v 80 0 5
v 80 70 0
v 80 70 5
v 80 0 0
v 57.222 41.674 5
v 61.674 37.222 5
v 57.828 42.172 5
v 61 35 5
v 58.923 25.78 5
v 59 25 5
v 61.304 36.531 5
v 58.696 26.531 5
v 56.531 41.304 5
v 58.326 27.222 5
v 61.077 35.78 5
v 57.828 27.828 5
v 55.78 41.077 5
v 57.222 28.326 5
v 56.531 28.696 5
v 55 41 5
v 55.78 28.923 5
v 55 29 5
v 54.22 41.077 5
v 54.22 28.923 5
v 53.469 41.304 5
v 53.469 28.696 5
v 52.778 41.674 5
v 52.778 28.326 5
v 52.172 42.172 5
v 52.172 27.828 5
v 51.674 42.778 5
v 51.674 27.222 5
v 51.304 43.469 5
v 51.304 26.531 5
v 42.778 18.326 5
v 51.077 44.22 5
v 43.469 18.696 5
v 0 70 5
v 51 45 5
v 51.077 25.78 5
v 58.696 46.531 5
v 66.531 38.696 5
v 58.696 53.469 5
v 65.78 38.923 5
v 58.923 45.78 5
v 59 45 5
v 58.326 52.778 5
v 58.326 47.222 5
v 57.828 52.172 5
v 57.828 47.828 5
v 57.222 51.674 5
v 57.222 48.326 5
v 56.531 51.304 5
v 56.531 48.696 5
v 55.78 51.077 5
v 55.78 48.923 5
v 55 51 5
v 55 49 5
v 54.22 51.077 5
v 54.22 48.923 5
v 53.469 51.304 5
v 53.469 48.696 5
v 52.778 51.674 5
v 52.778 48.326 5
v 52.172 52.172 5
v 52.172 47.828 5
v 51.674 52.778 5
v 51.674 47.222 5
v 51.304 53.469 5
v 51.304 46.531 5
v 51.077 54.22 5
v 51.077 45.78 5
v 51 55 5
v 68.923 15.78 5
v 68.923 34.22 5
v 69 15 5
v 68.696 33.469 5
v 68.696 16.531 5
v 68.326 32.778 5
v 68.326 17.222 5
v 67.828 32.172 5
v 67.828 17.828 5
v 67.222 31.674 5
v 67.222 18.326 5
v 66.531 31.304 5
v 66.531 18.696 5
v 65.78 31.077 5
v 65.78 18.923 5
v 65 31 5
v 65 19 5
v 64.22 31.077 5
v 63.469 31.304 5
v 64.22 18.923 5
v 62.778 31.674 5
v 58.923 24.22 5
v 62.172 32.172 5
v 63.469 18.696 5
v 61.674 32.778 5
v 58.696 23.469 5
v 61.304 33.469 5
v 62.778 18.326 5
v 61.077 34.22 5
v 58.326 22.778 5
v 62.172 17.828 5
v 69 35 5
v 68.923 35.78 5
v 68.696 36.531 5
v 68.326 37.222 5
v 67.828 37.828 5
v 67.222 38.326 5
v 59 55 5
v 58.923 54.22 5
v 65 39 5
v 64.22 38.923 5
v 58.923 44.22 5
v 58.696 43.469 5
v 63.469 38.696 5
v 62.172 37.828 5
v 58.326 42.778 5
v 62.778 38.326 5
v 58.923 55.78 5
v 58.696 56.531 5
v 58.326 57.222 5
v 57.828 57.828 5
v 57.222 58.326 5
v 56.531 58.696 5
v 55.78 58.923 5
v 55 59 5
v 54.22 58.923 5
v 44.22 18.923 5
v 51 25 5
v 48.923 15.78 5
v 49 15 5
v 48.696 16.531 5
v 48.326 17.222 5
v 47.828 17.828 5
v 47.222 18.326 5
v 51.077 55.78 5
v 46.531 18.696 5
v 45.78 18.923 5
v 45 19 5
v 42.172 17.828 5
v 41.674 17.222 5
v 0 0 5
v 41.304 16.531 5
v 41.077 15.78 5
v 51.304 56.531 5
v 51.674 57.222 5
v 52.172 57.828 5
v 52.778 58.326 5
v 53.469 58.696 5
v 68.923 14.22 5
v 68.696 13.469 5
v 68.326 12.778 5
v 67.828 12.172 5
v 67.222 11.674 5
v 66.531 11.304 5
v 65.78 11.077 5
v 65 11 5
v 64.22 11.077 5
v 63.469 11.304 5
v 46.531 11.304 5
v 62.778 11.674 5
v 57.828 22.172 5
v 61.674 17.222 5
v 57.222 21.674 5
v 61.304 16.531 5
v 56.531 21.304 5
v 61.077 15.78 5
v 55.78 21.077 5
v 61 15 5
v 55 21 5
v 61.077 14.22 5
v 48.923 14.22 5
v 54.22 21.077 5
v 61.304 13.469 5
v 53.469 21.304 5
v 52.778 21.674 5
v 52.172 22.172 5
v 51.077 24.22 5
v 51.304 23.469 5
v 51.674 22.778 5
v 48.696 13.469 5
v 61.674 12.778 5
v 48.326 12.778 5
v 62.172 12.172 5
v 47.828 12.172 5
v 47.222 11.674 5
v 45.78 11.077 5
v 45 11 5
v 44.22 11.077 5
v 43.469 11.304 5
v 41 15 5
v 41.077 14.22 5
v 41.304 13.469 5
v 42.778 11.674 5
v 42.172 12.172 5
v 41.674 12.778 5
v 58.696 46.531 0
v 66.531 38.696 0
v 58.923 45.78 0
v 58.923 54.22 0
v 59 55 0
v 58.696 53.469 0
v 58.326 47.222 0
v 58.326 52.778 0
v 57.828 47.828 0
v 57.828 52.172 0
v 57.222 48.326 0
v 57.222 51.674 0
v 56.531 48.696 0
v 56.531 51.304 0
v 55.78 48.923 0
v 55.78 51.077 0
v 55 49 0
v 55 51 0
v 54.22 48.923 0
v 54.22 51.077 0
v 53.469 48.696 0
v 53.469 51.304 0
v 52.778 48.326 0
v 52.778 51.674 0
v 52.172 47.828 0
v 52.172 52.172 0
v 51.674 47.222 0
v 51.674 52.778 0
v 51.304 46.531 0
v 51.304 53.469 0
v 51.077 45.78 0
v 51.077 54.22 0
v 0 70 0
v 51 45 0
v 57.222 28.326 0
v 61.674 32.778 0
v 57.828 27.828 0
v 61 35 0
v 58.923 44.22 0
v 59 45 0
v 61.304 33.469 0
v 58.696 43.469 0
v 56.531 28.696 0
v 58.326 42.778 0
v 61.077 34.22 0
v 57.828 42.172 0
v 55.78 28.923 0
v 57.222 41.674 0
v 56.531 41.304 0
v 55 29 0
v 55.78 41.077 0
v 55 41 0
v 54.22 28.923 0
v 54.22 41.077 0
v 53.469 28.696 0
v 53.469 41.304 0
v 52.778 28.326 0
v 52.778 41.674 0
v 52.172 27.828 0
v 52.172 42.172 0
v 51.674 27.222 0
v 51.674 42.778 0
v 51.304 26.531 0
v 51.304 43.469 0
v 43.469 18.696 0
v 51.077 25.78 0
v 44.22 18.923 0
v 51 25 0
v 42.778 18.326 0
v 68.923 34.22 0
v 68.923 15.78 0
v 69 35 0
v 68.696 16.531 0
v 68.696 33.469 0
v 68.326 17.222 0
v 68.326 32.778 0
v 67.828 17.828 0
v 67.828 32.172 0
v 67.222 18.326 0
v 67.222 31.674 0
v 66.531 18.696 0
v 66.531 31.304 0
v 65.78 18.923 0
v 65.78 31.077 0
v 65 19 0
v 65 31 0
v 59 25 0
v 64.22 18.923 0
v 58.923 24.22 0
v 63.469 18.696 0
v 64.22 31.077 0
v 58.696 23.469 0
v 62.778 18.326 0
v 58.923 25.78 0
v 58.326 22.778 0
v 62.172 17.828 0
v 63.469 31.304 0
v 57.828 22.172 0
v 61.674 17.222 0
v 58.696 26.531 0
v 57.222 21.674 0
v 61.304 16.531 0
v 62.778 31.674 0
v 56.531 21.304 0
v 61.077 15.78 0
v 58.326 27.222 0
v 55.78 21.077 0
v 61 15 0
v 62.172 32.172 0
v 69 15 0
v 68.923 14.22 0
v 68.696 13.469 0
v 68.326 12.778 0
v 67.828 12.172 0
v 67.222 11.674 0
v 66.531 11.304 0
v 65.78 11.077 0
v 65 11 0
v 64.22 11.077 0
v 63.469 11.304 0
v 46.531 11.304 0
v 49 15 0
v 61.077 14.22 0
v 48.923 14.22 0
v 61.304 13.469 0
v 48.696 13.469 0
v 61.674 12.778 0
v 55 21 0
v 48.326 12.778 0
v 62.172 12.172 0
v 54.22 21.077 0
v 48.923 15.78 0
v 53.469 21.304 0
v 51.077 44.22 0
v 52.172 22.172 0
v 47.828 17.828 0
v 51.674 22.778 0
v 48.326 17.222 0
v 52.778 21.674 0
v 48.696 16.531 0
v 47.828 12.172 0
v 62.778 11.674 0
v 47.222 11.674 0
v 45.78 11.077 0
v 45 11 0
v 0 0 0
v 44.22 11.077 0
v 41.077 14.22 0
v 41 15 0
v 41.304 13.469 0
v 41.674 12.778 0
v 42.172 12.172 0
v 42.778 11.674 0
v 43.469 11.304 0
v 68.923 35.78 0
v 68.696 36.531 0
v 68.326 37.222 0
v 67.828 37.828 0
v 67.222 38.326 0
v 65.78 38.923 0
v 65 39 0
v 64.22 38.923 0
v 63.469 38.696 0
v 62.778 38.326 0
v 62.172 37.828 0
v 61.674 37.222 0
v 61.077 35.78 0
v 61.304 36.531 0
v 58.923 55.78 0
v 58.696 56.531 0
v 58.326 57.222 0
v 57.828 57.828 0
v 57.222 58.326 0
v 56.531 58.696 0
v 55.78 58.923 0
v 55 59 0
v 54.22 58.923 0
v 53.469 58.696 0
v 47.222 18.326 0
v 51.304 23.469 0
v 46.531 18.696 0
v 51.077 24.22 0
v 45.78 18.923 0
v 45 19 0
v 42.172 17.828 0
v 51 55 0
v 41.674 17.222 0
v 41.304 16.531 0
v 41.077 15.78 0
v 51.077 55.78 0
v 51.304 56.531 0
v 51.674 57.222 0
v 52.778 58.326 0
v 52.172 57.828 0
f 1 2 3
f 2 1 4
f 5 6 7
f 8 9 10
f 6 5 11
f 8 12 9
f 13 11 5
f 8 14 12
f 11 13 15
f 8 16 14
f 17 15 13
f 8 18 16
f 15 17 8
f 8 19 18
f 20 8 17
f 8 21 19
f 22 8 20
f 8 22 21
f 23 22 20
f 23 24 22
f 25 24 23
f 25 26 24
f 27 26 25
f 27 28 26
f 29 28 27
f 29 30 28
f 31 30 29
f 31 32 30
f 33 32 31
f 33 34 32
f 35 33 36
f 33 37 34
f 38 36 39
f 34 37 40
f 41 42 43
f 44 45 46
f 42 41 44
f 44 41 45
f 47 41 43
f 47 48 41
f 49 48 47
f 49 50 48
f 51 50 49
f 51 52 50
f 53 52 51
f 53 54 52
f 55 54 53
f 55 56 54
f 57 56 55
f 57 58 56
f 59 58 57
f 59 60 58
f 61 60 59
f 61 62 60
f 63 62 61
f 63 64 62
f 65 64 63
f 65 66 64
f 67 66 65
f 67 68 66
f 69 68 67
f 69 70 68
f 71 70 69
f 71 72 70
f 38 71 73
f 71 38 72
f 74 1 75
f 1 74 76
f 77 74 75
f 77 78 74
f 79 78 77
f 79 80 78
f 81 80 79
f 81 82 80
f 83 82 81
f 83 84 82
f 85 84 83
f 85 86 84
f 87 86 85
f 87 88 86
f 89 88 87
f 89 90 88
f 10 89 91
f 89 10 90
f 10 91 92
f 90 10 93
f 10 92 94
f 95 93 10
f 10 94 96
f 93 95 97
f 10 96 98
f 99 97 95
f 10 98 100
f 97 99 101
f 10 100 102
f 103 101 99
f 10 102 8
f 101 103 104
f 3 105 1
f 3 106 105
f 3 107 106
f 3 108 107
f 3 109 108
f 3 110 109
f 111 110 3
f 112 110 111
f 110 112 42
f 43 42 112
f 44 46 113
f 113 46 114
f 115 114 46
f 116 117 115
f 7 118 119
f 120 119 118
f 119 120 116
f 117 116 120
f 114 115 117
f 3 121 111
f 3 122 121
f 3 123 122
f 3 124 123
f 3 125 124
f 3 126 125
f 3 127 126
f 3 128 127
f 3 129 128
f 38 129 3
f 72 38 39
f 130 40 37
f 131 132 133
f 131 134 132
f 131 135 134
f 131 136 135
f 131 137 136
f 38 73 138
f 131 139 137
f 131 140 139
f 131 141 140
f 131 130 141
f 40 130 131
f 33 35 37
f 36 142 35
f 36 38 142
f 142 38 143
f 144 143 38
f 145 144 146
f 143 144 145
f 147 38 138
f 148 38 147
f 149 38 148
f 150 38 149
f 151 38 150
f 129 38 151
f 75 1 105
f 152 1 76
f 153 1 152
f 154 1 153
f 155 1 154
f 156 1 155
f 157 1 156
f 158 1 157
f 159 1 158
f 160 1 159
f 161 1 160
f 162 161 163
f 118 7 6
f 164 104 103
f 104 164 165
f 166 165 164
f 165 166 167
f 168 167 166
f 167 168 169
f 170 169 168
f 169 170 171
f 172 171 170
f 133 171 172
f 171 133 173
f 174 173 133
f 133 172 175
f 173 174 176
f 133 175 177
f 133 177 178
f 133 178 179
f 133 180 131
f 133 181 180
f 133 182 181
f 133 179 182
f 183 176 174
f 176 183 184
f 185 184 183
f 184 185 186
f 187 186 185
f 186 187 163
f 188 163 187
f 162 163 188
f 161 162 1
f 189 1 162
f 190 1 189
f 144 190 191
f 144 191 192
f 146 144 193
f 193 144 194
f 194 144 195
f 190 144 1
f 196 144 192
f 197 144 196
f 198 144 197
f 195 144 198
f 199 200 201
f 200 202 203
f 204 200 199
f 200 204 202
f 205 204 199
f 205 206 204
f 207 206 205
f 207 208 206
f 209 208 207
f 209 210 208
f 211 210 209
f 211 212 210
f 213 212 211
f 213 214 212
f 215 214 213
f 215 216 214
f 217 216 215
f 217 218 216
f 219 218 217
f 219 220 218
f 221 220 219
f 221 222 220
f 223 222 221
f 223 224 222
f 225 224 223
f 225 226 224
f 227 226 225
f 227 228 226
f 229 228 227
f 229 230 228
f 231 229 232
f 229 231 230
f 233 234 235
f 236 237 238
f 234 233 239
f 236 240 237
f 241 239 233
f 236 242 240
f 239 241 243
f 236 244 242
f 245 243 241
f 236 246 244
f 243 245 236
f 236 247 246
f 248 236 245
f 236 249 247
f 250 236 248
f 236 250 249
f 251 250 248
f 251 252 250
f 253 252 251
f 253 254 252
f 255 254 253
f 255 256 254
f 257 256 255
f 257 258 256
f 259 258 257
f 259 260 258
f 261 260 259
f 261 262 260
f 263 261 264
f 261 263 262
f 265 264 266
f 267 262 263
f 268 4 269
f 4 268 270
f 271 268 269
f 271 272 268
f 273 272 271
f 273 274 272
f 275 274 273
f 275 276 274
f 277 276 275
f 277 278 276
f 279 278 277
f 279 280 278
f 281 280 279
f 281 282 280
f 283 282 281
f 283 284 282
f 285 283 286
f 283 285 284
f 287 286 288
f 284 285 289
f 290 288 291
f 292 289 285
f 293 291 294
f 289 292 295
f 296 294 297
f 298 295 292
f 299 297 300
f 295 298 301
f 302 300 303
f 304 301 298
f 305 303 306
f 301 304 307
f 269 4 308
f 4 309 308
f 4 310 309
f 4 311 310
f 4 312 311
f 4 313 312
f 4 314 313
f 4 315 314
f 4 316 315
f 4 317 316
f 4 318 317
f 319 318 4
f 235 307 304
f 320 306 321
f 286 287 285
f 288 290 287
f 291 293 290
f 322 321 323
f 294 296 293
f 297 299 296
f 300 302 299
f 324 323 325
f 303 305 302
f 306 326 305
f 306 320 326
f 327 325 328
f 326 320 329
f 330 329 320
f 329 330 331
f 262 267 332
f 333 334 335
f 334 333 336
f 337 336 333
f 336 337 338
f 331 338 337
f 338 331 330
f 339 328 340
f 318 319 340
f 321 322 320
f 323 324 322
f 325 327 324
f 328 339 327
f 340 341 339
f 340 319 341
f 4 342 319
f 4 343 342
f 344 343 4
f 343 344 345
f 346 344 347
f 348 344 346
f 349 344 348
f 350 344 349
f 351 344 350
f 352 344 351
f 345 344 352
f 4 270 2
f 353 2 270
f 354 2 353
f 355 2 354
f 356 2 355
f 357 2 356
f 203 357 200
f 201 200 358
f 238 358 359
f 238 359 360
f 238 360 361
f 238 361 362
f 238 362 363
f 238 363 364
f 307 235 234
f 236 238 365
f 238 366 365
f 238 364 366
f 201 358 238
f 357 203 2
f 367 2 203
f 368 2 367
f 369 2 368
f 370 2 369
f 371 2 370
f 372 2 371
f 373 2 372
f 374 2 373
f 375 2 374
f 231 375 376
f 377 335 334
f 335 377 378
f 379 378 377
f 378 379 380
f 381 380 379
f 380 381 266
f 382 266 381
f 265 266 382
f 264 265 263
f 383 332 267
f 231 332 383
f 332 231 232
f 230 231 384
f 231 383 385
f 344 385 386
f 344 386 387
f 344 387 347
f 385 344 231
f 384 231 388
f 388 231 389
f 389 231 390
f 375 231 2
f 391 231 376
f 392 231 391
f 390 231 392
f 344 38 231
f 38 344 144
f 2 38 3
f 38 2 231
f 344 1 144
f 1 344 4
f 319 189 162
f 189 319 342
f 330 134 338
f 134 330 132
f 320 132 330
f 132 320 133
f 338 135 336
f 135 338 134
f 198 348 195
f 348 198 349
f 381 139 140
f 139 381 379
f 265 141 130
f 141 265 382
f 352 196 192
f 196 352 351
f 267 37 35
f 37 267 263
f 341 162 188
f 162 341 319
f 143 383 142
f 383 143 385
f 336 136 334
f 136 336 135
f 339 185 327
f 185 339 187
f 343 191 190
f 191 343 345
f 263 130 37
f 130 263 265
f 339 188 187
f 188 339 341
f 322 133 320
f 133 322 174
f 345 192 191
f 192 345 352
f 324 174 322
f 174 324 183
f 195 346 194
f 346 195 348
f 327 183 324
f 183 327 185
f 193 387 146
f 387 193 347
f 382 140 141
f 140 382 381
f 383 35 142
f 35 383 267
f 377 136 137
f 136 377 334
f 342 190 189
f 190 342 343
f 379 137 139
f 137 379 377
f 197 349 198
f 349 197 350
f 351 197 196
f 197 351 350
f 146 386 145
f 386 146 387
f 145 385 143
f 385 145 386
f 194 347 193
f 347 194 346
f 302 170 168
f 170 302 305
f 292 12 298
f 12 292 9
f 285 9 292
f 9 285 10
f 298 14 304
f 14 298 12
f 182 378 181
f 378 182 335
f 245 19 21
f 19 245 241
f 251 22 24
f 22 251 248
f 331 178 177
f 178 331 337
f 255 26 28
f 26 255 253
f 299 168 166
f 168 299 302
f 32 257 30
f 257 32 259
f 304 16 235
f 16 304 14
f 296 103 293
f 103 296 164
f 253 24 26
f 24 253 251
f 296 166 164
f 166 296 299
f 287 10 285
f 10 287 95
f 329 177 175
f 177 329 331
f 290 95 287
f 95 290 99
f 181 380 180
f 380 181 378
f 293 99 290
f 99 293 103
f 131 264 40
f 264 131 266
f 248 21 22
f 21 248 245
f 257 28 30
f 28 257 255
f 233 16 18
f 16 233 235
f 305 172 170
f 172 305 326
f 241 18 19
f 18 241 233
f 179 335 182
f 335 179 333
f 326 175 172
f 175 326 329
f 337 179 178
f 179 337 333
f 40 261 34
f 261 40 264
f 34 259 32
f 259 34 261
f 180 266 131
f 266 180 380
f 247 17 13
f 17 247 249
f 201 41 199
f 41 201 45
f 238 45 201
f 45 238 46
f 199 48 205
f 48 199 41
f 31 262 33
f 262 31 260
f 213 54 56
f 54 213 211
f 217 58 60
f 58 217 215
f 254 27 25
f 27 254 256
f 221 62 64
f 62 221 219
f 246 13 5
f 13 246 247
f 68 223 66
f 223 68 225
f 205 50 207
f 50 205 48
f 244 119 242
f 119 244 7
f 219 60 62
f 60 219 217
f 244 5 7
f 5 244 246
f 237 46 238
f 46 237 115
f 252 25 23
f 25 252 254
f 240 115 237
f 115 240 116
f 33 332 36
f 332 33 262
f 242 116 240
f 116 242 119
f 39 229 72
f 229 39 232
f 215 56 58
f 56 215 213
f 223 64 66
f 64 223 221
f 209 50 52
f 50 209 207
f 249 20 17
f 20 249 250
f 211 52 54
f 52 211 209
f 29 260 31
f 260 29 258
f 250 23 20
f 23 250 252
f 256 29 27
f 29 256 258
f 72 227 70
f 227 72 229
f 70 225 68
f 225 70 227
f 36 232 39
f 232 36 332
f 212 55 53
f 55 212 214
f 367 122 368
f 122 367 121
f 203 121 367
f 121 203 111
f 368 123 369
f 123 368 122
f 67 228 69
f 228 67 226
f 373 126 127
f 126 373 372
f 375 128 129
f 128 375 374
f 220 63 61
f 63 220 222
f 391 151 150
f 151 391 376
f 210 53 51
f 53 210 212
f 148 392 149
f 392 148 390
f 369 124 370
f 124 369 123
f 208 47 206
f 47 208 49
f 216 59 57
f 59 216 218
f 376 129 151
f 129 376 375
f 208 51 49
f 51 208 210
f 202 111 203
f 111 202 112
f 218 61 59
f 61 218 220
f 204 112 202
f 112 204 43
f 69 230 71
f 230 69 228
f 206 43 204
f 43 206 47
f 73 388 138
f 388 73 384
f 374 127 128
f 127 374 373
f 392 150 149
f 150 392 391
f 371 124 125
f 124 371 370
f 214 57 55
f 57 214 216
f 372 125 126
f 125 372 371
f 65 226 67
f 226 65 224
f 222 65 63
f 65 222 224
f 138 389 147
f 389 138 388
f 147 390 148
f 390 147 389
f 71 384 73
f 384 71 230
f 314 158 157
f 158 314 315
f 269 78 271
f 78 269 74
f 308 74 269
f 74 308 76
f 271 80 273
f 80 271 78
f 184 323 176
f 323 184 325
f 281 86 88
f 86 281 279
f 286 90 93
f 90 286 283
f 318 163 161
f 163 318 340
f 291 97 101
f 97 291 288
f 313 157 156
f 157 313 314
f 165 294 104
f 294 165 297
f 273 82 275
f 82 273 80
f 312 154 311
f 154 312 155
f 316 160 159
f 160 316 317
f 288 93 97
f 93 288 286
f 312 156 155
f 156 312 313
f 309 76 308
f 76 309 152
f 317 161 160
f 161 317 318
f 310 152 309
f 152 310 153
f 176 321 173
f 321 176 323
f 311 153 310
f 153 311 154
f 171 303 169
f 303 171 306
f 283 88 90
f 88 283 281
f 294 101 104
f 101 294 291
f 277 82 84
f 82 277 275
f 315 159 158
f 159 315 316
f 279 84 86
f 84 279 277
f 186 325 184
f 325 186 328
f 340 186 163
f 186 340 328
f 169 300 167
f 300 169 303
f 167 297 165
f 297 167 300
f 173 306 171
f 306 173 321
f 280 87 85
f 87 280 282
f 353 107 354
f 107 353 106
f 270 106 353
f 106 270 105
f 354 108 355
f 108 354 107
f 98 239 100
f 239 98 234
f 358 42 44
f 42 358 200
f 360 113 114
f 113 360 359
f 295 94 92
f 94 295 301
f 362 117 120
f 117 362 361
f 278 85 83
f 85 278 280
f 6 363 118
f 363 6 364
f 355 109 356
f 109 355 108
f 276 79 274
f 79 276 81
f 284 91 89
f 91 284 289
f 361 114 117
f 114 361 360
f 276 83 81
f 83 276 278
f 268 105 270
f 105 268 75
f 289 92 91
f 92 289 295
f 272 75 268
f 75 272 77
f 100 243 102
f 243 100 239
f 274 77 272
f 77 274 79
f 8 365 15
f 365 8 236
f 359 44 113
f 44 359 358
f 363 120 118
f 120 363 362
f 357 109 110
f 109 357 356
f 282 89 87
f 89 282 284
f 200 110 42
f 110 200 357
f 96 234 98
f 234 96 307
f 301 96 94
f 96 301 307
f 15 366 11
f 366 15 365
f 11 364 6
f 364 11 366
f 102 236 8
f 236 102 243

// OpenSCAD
$fn = 32;

// ----------------------------------------------------------------------
// Hole field: plate with holes at given coordinates
// ----------------------------------------------------------------------

// --- parameters (mm) ---
plate_l = 80;             // plate length, X
plate_w = 70;             // plate width, Y
plate_t = 5;              // plate thickness, Z
hole_d = 8;               // hole diameter

difference() {
  cube([plate_l, plate_w, plate_t]);
  translate([45, 15, -1]) cylinder(h = plate_t + 2, d = hole_d);
  translate([55, 25, -1]) cylinder(h = plate_t + 2, d = hole_d);
  translate([55, 45, -1]) cylinder(h = plate_t + 2, d = hole_d);
  translate([55, 55, -1]) cylinder(h = plate_t + 2, d = hole_d);
  translate([65, 15, -1]) cylinder(h = plate_t + 2, d = hole_d);
  translate([65, 35, -1]) cylinder(h = plate_t + 2, d = hole_d);
}
